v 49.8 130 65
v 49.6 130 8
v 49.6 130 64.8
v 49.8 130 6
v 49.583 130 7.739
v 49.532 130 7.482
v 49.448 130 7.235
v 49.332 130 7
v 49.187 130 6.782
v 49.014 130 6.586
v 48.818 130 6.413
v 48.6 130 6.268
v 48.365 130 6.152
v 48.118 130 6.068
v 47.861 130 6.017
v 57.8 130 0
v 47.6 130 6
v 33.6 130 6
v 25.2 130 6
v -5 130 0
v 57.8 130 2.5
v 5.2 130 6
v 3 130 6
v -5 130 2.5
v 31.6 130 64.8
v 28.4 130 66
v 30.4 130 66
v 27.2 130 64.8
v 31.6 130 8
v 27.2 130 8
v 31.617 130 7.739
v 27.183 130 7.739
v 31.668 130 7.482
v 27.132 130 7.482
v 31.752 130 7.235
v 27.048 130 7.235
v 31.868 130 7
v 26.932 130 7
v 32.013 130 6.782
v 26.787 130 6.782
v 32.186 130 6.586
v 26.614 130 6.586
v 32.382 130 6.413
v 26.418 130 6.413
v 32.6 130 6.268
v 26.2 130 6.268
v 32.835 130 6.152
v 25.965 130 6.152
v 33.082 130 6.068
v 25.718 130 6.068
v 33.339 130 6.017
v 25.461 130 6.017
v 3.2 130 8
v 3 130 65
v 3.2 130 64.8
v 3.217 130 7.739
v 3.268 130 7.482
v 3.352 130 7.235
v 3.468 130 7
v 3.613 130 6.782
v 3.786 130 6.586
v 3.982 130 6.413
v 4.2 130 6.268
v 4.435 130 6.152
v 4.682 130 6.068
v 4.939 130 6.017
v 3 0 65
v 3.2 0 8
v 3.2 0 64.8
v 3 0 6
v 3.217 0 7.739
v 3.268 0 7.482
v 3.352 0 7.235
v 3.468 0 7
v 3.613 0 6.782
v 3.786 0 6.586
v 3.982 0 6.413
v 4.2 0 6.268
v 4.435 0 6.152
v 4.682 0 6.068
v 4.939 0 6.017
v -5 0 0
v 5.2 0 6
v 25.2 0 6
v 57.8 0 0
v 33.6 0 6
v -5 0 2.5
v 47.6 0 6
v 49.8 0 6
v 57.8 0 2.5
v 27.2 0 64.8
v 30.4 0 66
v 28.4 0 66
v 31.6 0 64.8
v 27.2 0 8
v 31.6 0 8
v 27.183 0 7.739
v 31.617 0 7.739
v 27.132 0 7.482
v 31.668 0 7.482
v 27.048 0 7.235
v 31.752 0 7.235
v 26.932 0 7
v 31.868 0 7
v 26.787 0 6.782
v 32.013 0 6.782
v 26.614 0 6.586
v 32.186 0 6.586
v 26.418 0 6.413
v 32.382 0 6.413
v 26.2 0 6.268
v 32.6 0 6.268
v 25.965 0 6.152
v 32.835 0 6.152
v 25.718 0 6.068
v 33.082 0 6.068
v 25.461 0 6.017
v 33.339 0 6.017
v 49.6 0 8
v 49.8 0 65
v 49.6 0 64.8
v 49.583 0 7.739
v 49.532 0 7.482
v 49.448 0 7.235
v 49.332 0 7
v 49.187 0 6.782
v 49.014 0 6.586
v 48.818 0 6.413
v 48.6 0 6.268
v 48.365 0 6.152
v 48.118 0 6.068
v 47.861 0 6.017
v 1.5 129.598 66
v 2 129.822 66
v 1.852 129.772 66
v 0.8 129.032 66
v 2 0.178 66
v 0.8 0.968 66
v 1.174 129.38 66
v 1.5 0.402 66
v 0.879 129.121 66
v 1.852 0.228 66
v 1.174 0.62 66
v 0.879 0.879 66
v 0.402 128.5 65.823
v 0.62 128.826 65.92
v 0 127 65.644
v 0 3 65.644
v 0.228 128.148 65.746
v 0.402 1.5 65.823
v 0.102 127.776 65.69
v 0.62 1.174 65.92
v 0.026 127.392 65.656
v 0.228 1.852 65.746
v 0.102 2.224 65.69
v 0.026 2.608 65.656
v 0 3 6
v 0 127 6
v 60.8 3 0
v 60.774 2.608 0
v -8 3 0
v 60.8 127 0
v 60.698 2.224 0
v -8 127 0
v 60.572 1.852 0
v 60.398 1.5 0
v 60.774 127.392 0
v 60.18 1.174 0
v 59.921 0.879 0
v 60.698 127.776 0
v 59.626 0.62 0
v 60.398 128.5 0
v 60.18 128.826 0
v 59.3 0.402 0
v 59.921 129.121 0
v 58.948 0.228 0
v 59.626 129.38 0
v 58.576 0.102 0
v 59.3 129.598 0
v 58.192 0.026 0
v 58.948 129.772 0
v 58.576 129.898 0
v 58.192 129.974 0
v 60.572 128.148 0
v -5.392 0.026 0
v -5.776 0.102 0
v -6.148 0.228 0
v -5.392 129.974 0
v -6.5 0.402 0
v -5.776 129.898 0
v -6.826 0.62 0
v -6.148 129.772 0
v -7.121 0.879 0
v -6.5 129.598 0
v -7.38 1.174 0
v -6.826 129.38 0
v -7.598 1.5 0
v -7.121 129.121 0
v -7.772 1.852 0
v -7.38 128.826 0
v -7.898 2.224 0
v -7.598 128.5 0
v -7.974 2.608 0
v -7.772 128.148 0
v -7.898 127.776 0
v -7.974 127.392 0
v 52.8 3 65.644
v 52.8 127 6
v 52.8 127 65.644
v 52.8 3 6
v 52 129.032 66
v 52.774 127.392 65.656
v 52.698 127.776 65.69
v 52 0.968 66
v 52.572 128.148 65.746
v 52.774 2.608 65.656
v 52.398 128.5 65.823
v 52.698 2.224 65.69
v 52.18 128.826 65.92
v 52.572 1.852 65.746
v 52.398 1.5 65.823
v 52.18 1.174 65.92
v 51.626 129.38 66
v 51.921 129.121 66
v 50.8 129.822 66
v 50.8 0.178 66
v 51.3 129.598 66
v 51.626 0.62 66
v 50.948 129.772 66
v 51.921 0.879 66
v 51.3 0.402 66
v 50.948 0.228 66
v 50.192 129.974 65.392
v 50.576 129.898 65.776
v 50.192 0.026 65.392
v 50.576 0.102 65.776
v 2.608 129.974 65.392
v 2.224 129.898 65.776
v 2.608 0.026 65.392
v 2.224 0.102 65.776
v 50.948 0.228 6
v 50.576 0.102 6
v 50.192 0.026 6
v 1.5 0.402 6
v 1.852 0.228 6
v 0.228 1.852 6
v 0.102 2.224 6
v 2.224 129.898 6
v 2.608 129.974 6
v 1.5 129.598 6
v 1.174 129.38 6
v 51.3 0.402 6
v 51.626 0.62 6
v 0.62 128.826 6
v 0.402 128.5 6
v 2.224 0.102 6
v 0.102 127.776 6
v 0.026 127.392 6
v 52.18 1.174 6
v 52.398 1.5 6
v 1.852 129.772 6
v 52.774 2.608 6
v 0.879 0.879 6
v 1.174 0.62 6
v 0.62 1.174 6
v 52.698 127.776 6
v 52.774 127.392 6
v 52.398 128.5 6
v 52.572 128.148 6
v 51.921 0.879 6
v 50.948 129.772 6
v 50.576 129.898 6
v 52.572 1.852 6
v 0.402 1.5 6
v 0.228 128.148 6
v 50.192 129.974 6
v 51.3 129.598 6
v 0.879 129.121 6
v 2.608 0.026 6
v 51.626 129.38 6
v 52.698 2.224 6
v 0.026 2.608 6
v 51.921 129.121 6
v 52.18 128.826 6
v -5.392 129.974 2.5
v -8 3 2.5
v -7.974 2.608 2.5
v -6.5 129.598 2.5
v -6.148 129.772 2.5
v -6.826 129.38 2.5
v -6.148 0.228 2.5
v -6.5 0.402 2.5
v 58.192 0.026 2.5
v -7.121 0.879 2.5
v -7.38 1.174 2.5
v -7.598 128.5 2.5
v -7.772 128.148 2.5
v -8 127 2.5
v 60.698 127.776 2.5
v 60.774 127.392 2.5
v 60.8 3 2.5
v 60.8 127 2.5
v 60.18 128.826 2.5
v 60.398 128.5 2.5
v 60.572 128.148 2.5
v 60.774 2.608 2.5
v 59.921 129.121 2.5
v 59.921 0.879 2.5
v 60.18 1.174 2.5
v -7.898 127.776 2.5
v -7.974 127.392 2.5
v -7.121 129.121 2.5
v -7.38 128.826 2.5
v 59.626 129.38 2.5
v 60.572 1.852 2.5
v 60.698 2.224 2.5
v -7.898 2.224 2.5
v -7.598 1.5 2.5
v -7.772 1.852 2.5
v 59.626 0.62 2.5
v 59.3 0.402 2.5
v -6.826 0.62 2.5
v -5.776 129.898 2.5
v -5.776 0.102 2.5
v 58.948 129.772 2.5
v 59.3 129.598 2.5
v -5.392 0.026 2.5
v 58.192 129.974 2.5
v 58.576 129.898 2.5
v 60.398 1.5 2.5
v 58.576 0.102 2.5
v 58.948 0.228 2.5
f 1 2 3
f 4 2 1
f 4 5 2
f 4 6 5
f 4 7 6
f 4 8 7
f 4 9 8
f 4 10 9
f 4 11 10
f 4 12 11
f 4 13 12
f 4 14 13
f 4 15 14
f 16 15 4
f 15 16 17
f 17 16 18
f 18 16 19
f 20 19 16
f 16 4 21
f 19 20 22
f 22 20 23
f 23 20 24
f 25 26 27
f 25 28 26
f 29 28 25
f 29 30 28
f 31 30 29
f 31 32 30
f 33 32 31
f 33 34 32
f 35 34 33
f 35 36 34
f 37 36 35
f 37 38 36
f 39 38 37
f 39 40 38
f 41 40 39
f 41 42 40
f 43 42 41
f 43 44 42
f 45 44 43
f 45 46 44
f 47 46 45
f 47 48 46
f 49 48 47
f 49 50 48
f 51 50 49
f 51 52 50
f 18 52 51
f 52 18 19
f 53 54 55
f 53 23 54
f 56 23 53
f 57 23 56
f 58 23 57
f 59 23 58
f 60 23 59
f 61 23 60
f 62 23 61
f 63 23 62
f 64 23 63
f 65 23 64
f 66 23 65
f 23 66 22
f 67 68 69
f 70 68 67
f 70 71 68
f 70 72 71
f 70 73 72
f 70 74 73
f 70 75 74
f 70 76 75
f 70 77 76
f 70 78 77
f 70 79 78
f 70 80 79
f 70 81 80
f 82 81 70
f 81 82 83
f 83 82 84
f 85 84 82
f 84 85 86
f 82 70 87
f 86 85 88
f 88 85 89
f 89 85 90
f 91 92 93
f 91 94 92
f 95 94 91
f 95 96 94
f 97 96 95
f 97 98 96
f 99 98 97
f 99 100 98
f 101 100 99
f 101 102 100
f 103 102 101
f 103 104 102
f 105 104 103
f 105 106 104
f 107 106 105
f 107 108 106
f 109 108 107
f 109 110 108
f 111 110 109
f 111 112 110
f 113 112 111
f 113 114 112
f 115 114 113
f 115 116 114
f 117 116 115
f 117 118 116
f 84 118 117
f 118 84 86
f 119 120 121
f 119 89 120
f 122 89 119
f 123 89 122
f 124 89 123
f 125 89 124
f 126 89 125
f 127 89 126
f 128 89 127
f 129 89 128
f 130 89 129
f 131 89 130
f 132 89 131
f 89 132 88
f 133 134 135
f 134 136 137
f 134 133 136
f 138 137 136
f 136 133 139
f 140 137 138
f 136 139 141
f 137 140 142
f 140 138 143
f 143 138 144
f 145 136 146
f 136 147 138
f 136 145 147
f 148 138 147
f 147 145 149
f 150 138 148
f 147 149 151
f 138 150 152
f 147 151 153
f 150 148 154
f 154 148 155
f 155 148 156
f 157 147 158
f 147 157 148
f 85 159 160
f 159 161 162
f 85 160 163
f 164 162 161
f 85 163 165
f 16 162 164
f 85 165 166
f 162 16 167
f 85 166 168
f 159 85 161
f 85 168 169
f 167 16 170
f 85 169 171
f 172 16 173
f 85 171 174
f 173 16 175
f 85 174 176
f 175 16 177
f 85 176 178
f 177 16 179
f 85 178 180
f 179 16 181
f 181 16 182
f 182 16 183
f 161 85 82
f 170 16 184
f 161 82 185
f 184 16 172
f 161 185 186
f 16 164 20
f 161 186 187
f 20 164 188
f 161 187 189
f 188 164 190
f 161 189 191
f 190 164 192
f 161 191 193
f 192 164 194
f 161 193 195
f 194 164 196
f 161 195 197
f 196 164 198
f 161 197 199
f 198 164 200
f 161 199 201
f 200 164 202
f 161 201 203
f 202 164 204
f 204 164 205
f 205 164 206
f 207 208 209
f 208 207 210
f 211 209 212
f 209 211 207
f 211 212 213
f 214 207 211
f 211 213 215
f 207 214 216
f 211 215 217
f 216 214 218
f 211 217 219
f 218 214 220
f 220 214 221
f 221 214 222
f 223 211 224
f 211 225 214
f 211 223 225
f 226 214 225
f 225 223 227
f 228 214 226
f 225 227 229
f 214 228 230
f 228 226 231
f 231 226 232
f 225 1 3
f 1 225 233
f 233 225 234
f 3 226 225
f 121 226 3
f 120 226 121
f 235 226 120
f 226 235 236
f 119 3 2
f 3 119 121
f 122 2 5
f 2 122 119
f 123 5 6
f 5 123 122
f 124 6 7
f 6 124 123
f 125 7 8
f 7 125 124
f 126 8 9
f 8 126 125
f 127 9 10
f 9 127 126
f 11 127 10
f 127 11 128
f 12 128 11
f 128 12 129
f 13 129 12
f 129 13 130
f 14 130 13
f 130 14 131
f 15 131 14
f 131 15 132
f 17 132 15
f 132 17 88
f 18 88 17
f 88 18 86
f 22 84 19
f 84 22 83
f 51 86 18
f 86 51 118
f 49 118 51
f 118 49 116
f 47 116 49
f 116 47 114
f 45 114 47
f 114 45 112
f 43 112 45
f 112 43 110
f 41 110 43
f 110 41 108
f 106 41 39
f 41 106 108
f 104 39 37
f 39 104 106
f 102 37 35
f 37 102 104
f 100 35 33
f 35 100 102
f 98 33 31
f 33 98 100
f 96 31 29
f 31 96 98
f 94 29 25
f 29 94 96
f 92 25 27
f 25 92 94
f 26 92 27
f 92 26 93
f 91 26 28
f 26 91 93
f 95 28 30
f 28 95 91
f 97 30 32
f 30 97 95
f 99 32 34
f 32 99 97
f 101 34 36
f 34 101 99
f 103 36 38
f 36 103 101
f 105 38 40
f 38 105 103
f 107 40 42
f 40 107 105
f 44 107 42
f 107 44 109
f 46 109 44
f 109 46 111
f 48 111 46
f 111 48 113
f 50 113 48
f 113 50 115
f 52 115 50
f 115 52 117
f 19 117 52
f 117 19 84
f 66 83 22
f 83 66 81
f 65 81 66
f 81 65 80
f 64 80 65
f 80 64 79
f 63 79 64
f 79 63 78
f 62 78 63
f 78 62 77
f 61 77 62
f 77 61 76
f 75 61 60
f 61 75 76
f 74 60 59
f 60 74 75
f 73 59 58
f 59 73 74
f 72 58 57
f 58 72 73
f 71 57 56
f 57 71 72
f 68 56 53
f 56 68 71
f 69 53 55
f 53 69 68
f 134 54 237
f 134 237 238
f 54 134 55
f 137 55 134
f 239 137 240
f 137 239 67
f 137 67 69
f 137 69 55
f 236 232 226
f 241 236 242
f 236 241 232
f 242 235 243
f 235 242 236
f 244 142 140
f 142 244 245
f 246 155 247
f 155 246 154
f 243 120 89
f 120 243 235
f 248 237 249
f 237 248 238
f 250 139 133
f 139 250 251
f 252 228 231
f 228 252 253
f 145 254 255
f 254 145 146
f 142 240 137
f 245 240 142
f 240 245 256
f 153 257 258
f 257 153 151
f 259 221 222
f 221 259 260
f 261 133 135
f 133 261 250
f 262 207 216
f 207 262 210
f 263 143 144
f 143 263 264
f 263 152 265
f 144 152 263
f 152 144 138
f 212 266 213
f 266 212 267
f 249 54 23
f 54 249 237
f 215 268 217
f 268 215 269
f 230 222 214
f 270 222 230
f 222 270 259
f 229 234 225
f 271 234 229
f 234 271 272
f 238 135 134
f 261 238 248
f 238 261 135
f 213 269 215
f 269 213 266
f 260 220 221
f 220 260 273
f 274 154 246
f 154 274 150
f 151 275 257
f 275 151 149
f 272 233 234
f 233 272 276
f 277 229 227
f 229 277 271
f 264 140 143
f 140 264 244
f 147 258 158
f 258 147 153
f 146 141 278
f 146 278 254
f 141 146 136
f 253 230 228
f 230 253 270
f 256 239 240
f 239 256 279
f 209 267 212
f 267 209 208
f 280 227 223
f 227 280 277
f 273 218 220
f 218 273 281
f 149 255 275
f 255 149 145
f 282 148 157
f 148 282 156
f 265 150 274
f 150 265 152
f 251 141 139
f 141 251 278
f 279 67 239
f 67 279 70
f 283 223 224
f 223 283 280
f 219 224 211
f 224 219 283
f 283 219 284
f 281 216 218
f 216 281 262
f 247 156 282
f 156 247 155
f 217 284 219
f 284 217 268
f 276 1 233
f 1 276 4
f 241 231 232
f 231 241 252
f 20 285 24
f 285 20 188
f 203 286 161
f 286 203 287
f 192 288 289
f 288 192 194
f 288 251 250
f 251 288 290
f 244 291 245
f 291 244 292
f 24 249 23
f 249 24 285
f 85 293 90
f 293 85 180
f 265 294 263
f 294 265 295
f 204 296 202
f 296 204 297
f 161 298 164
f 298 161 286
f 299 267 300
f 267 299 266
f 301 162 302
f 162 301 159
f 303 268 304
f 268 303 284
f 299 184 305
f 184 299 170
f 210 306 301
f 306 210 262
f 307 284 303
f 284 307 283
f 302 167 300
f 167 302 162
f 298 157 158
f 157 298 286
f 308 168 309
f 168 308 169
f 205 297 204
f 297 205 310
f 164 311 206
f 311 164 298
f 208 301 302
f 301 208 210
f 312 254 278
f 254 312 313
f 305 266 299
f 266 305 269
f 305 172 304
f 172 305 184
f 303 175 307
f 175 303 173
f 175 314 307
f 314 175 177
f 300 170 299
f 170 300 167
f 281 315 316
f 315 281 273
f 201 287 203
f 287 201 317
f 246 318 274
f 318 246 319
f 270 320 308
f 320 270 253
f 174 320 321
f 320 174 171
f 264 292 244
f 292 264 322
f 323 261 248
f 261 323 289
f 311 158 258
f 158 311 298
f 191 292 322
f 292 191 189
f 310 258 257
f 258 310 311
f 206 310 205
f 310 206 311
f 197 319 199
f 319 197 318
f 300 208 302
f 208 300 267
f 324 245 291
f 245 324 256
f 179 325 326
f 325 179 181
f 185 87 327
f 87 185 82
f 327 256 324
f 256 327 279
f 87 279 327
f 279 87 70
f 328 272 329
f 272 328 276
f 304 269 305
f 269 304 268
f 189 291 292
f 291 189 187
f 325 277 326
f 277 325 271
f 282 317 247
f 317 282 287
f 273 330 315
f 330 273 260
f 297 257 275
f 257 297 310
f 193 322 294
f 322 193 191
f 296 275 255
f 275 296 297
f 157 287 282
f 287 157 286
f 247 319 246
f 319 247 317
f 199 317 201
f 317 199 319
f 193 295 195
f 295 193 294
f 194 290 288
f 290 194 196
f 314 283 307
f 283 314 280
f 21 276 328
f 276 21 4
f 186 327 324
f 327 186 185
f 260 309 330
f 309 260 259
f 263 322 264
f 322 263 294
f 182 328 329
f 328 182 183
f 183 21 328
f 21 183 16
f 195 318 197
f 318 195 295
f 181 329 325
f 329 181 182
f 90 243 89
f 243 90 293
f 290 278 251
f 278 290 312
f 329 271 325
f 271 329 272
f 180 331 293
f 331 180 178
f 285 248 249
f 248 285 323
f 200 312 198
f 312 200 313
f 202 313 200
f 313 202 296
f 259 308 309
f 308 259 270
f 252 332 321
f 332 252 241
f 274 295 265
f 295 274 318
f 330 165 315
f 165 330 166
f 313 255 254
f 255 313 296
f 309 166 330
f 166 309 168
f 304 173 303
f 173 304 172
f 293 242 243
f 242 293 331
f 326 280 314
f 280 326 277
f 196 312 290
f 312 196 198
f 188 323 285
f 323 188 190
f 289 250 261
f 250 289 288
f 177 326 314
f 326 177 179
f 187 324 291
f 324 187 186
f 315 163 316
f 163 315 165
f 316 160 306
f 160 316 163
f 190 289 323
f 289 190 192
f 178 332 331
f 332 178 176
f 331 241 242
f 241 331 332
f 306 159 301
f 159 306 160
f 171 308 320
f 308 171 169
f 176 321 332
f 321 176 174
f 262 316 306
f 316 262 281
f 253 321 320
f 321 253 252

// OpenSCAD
// Vertikaler Laptop-/Tablet-Ständer, 2 Schlitze in einem Teil
// Alle Maße in Millimetern (Regel: units-mm)
//
// Änderungen gegenüber 001 (Statik nachgerechnet, siehe Lastfälle unten):
//   - Fußleiste: unten 8 mm pro Seite Überstand, nach oben auf Körperbreite
//     auslaufend. Aufstandsbreite 68.8 mm, der Körper bleibt oben 52.8 mm.
//     Grund: der kritische Lastfall ist NICHT die Rippenfestigkeit, sondern
//     Kippen. Nur die Aufstandsbreite hilft dagegen nennenswert.
//   - base_d 110 -> 130 mm gegen Kippen in Längsrichtung. Kostet nur
//     Tischtiefe, nicht die knappe Tischbreite.
//   - floor_t 5 -> 6 mm. Der Sockel ist jetzt die Fußleiste, die äußere
//     Lippe soll nicht zu dünn auslaufen.
//
// Kontext (Regel: context-first), Stand bei Erstellung:
//   - context/printer.md:    Anycubic Kobra S1, 0.4mm Düse, PEI, 250mm Bauraum
//   - context/tolerances.md: eff. XY-Fehler ~0.15–0.2mm/Seite. Hier irrelevant
//                            für die Funktion (kein Passsitz), aber er macht
//                            die Schlitze real ~0.3–0.4mm schmaler als nominal
//                            -> im Puffer unten schon berücksichtigt.
//   - context/materials.md:  noch leer -> PLA angenommen
//
// Anforderungen aus dem Design-Dialog:
//   - Laptop 20mm dick, "ein wenig Puffer" -> 2.0mm Luft pro Seite
//   - iPad 15mm dick (mit Hülle)           -> 1.5mm Luft pro Seite
//   - Ein Teil, beide Schlitze nebeneinander
//   - Geräte stehen senkrecht, straff geführt (keine Neigung)
//   - Minimalistisch und schmal: auf dem Schreibtisch ist wenig Breite frei
//   - Nachgereicht: Kippsicherheit wichtiger als die letzten 16mm Breite,
//     solange der Körper oben schmal bleibt
//
// Aufbau / Prinzip:
//   Eine Fußleiste (foot_h hoch, foot_flare pro Seite breiter) trägt den
//   Sockel mit drei aufstehenden Rippen. Dazwischen die beiden Schlitze. Die
//   Schlitze laufen in Y komplett durch (vorne und hinten offen) – das spart
//   Material, macht das Teil leichter zu reinigen und erlaubt es, den Laptop
//   von jeder Seite einzuschieben.
//
//   Die schmale Seite (X) zeigt zum Nutzer, die lange Seite (Y, base_d) geht
//   in die Tischtiefe. Der Laptop steht also mit seiner Breitseite (~31cm)
//   in Y -> auf dem Tisch verbraucht der Ständer nur ~7cm Breite.
//
//   Schlitzmund und obere Außenkanten sind angefast (mouth_c/edge_c), der
//   Schlitzgrund hat eine Hohlkehle (fillet_r).
//
// ---------------------------------------------------------------------------
// LASTFÄLLE (nachgerechnet, nicht geschätzt)
// ---------------------------------------------------------------------------
//
// 1) Rippe auf Biegung – unkritisch, mit großem Abstand.
//    Rippe = einseitig eingespannter Balken, Länge wall_h, Querschnitt
//    base_d x wall_t. Die Biegespannung an der Wurzel wirkt in Z-Richtung,
//    also QUER zu den Layern -> maßgebend ist die Layerhaftung, konservativ
//    25 MPa (massives PLA hätte ~50).
//      Außenrippe 3.2mm: Bruch erst bei ~92 N Horizontalkraft an der
//                        Rippenoberkante (~9 kg).
//      Mittelrippe 4.4mm: ~175 N (~18 kg).
//    Real wirkt dort: der Laptop lehnt sich im Schlitzspiel (3.8°) an die
//    Rippe -> ~2.2 N, Durchbiegung ~0.12 mm. Sicherheitsfaktor ~40.
//    Das Eigengewicht (1.8kg senkrecht auf 24 x 130 mm Auflage) erzeugt
//    0.006 MPa Druckspannung – irrelevant.
//    -> Die Rippen sind nicht die Schwachstelle. Nicht dünner machen als
//       3.2/4.4, aber dicker bringt nichts außer Breite.
//
// 2) Kippen – das ist der kritische Lastfall.
//    Ungünstig ist NUR der Laptop im linken Schlitz: dann sitzt der
//    Schwerpunkt seitlich außermittig. Die echten Zahlen rechnet der
//    echo()-Block unten aus den aktuellen Parametern aus.
//    Mit 001 (52.8mm breit) warf ihn ein Schubs von ~130 g oben am Laptop
//    um. Mit der Fußleiste sind es ~200 g.
//    Ballast hilft kaum: 150 g Stahl mittig im Sockel bringen nur +14 %,
//    weil mittig eingebaute Masse den Hebelarm nicht verlängert.
//    Nur die Aufstandsbreite zählt.
//
// Druckausrichtung: So wie das Teil steht, Fußunterseite aufs Bett.
//   Keine Stützen nötig: die Schlitze öffnen nach oben, alle Fasen und die
//   Fußschräge sind nach oben gerichtete Flächen, es gibt keine Brücke und
//   keinen Überhang. Die plane 68.8 x 130mm Fläche auf PEI = sehr gute
//   Haftung.
//   Empfehlung: Infill >= 30%. Layerrichtung: die Rippen werden liegend
//   aufgebaut, seitliche Belastung zieht quer zu den Layern – deshalb die
//   konservative Rechnung oben mit 25 MPa.
//
// Nach dem Druck: 4 Filzgleiter unter den Fuß kleben. Das schützt den Tisch
//   und verhindert, dass der Ständer beim Einschieben wegrutscht.
//
// Anpassen: Laptop dicker/dünner -> nur laptop_t ändern, alles andere
//   rechnet sich mit (auch die Kipp-Rechnung im echo()).

/* [Geräte] */
// Dicke des Laptops (gemessen, geschlossen)
laptop_t = 20;
// Luft pro Seite im Laptop-Schlitz
laptop_gap = 2.0;
// Dicke des iPads inkl. Hülle
ipad_t = 15;
// Luft pro Seite im iPad-Schlitz
ipad_gap = 1.5;
// Zweiten Schlitz überhaupt bauen
ipad_slot_on = true;

/* [Geräte-Annahmen für die Kipp-Rechnung] */
// Masse des Laptops in Gramm (14-Zoll-Klasse). Nur für echo(), nicht für
// die Geometrie – bei Bedarf mit dem echten Wert überschreiben.
laptop_mass_g = 1800;
// Höhe des geschlossenen Laptops, auf der Kante stehend
laptop_dev_h = 220;
// Masse des iPads inkl. Hülle in Gramm
ipad_mass_g = 700;
// Höhe des iPads, auf der Kante stehend
ipad_dev_h = 180;

/* [Ständer] */
// Wandstärke der beiden Außenrippen. Muss dicker sein als mouth_c + edge_c,
// sonst läuft die Rippe oben auf eine Schneide aus (siehe assert unten).
wall_t = 3.2;
// Wandstärke der Mittelrippe (trennt beide Schlitze, trägt von zwei Seiten)
mid_wall = 4.4;
// Höhe der Rippen über dem Schlitzgrund = Einstecktiefe des Geräts
wall_h = 60;
// Dicke des massiven Sockels unter den Schlitzen (= Höhe der Fußleiste)
floor_t = 6.0;
// Tiefe des Ständers (Y, in die Tischtiefe)
base_d = 130;

/* [Fußleiste] */
// Überstand der Fußleiste pro Seite in X. Das ist der einzige wirksame
// Hebel gegen Kippen – siehe Lastfall 2 im Kopf.
foot_flare = 8.0;
// Höhe der Fußleiste. Muss <= floor_t bleiben, sonst ragt sie in die
// Schlitze (siehe assert unten).
foot_h = 6.0;
// Davon der untere, senkrechte Teil. Der Rest läuft schräg nach oben auf
// Körperbreite aus. Nicht auf 0 setzen: die äußere Lippe würde sonst
// spitz auslaufen und beim ersten Anstoßen abbrechen.
foot_straight = 2.5;

/* [Kanten] */
// Fase am Schlitzmund (Einführhilfe – die funktionale Fase)
mouth_c = 1.2;
// Fase an den oberen Außenkanten (nur Optik/Haptik, deshalb kleiner:
// mouth_c + edge_c fressen sonst die Rippe oben komplett auf)
edge_c = 0.8;
// Hohlkehle am Schlitzgrund (Kerbspannung an der Rippenwurzel)
fillet_r = 2.0;
// Radius der senkrechten Außenkanten
corner_r = 3.0;

/* [Qualität] */
$fn = 48;

// ---------------------------------------------------------------------------
// Abgeleitete Maße
// ---------------------------------------------------------------------------

laptop_w = laptop_t + 2 * laptop_gap;   // lichte Schlitzbreite Laptop
ipad_w   = ipad_t   + 2 * ipad_gap;     // lichte Schlitzbreite iPad

// X-Positionen der Rippen-/Schlitzkanten, von links (0 = linke Körperkante)
x1 = wall_t;                                            // Laptop-Schlitz links
x2 = x1 + laptop_w;                                     // Laptop-Schlitz rechts
x3 = x2 + (ipad_slot_on ? mid_wall : 0);                // iPad-Schlitz links
x4 = x3 + (ipad_slot_on ? ipad_w : 0);                  // iPad-Schlitz rechts

total_w = x4 + wall_t;                  // Körperbreite oben
total_h = floor_t + wall_h;
foot_w  = total_w + 2 * foot_flare;     // Aufstandsbreite unten

// ---------------------------------------------------------------------------
// Kipp-Rechnung: Schwerpunkt der Einheit Ständer + Gerät(e)
// ---------------------------------------------------------------------------
// Alle x-Werte ab der LINKEN KANTE DER AUFSTANDSFLÄCHE, damit die Abstände
// direkt die Hebelarme zur Kippkante sind. Der Körper beginnt also bei
// x = foot_flare.

// Eigenmasse, grob: Volumen mal PLA-Dichte mal effektive Füllung. Die Rippen
// drucken bei 3.2/4.4mm Wandstärke praktisch massiv, der Sockel nicht ->
// ~0.6 im Mittel. Nur für die Rechnung, nicht kritisch.
vol_body   = total_w * base_d * floor_t
           + (2 * wall_t + (ipad_slot_on ? mid_wall : 0)) * base_d * wall_h;
vol_foot   = 2 * foot_flare * base_d * (foot_straight + (foot_h - foot_straight) / 2);
stand_g    = (vol_body + vol_foot) * 1.24e-3 * 0.6;

x_laptop   = foot_flare + x1 + laptop_w / 2;   // Schlitzmitte Laptop
x_ipad     = foot_flare + x3 + ipad_w / 2;     // Schlitzmitte iPad

// Schwerpunkt für eine Lastkombination. Rückgabe: [Masse, x, z]
function cog(ms, xs, zs) =
    let (M = ms[0] + ms[1] + ms[2])
    [ M,
      (ms[0]*xs[0] + ms[1]*xs[1] + ms[2]*xs[2]) / M,
      (ms[0]*zs[0] + ms[1]*zs[1] + ms[2]*zs[2]) / M ];

// Kippwinkel = atan(Hebelarm zur nächsten Kippkante / Schwerpunkthöhe)
function tip_angle(c) = atan(min(c[1], foot_w - c[1]) / c[2]);
// Horizontalkraft oben am Gerät, die zum Umkippen reicht, in Gramm-Äquivalent
function tip_push_g(c, push_h) = c[0] * min(c[1], foot_w - c[1]) / push_h;

c_lap  = cog([stand_g, laptop_mass_g, 0],
             [foot_w/2, x_laptop, 0],
             [floor_t * 0.9, floor_t + laptop_dev_h/2, 0]);
c_both = cog([stand_g, laptop_mass_g, ipad_mass_g],
             [foot_w/2, x_laptop, x_ipad],
             [floor_t * 0.9, floor_t + laptop_dev_h/2, floor_t + ipad_dev_h/2]);

// Längskippen: wie weit darf der Laptop in Y aus der Mitte stehen
y_off_max = (base_d / 2) * c_lap[0] / laptop_mass_g;

// Spiel des Geräts im Schlitz: um so viel Grad kann es im Schlitz kippeln
play_deg_l = atan(2 * laptop_gap / wall_h);
play_deg_i = atan(2 * ipad_gap / wall_h);

// Rippenfestigkeit (Lastfall 1): Bruchkraft an der Rippenoberkante.
// W = Widerstandsmoment des Rippenquerschnitts, sigma_z = Layerhaftung.
sigma_z   = 25;    // MPa, konservativ für PLA quer zu den Layern
f_break_o = sigma_z * (base_d * wall_t   * wall_t   / 6) / wall_h;
f_break_m = sigma_z * (base_d * mid_wall * mid_wall / 6) / wall_h;

// ---------------------------------------------------------------------------
// Prüfungen (Regel: printability-report – wird gemeldet, nicht stillschweigend
// korrigiert)
// ---------------------------------------------------------------------------

nozzle_d = 0.4;

// Restbreite der Rippen ganz oben, nachdem die Fasen abgezogen sind. Das ist
// die kritische Größe: läuft eine Rippe oben auf eine Schneide aus, kann der
// Drucker die letzten Layer nicht mehr sauber legen und die Kante wird
// ausgefranst und bröselig.
outer_top_w = wall_t   - mouth_c - edge_c;
mid_top_w   = mid_wall - 2 * mouth_c;

assert(wall_t   >= 2 * nozzle_d, "wall_t unter 2x Duesendurchmesser");
assert(mid_wall >= 2 * nozzle_d, "mid_wall unter 2x Duesendurchmesser");
assert(floor_t  >= 2 * nozzle_d, "floor_t unter 2x Duesendurchmesser");
assert(fillet_r <= wall_h,       "fillet_r groesser als die Rippenhoehe");
assert(outer_top_w >= 2 * nozzle_d,
       "Aussenrippe laeuft oben spitz zu: wall_t erhoehen oder Fasen kleiner");
assert(!ipad_slot_on || mid_top_w >= 2 * nozzle_d,
       "Mittelrippe laeuft oben spitz zu: mid_wall erhoehen oder mouth_c kleiner");
assert(mouth_c * 2 < min(laptop_w, ipad_slot_on ? ipad_w : 1e9),
       "mouth_c zu gross - die Fasen fressen den Schlitz auf");
assert(foot_h <= floor_t,
       "foot_h groesser als floor_t - die Fussleiste ragt in die Schlitze");
assert(foot_straight > 0 && foot_straight <= foot_h,
       "foot_straight muss zwischen 0 und foot_h liegen");
assert(foot_straight >= 2 * nozzle_d,
       "Fusslippe laeuft spitz aus: foot_straight erhoehen");
assert(corner_r <= foot_w / 2 && corner_r <= base_d / 2,
       "corner_r groesser als das halbe Teil");
assert(foot_w <= 250 && base_d <= 250 && total_h <= 250,
       "passt nicht auf das Druckbett (250 x 250 x 250)");

echo(str("Aussenmasse: Koerper ", total_w, " mm breit, Fuss ", foot_w,
         " mm breit, Tiefe ", base_d, " mm, Hoehe ", total_h, " mm"));
echo(str("Schlitz Laptop: ", laptop_w, " mm lichte Weite fuer ", laptop_t, " mm Geraet"));
echo(str("Schlitz iPad:   ", ipad_slot_on ? ipad_w : 0, " mm lichte Weite fuer ", ipad_t, " mm Geraet"));
echo(str("Rippenbreite oben nach Fasen: aussen ", outer_top_w, " mm, mitte ", mid_top_w, " mm"));
echo(str("Staender-Eigenmasse (geschaetzt, 30% Infill): ", round(stand_g), " g"));
echo(str("Lastfall 1 Rippenbruch: aussen ", round(f_break_o), " N, mitte ",
         round(f_break_m), " N an der Rippenoberkante"));
echo(str("Lastfall 2 Kippen, NUR Laptop links: ", tip_angle(c_lap),
         " Grad, Schubs oben ", round(tip_push_g(c_lap, floor_t + laptop_dev_h)), " g"));
echo(str("Lastfall 2 Kippen, beide Geraete:    ", tip_angle(c_both),
         " Grad, Schubs oben ", round(tip_push_g(c_both, floor_t + laptop_dev_h)), " g"));
echo(str("Laengskippen: Laptop darf max ", round(y_off_max), " mm aus der Mitte stehen"));
echo(str("Kippeln im Schlitz: Laptop ", play_deg_l, " Grad, iPad ", play_deg_i, " Grad"));

// ---------------------------------------------------------------------------
// 2D-Querschnitt des Körpers (X = Breite, Y der 2D-Ebene = Höhe Z des Teils)
// ---------------------------------------------------------------------------

// Material, das in eine Innenecke des Schlitzgrunds zurückgelegt wird:
// Quadrat minus Kreis = Hohlkehle. dir = +1 linke Ecke, -1 rechte Ecke.
module fillet_piece(x, dir) {
    r = fillet_r;
    translate([x, floor_t])
        difference() {
            translate([dir > 0 ? 0 : -r, 0]) square([r, r]);
            translate([dir * r, r]) circle(r = r);
        }
}

// Schnittfigur eines Schlitzes: Rechteck nach oben offen + Trichter am Mund.
module slot_cut(a, b) {
    c = mouth_c;
    union() {
        translate([a, floor_t]) square([b - a, total_h - floor_t + 1]);
        polygon([
            [a,     total_h - c],
            [b,     total_h - c],
            [b + c, total_h    ],
            [b + c, total_h + 1],
            [a - c, total_h + 1],
            [a - c, total_h    ]
        ]);
    }
}

module profile() {
    c = edge_c;
    union() {
        difference() {
            square([total_w, total_h]);

            slot_cut(x1, x2);
            if (ipad_slot_on) slot_cut(x3, x4);

            // Fasen an den oberen Außenkanten
            polygon([[-1, total_h - c], [c, total_h],
                     [c, total_h + 1], [-1, total_h + 1]]);
            polygon([[total_w + 1, total_h - c], [total_w - c, total_h],
                     [total_w - c, total_h + 1], [total_w + 1, total_h + 1]]);
        }

        // Hohlkehlen am Schlitzgrund
        fillet_piece(x1,  1);
        fillet_piece(x2, -1);
        if (ipad_slot_on) {
            fillet_piece(x3,  1);
            fillet_piece(x4, -1);
        }
    }
}

// ---------------------------------------------------------------------------
// Körper
// ---------------------------------------------------------------------------

// Prisma mit gerundeten senkrechten Kanten, Ursprung linke vordere Ecke
module rounded_prism(w, d, h) {
    linear_extrude(height = h)
        offset(r = corner_r) offset(delta = -corner_r)
            square([w, d]);
}

// Der eigentliche Ständer, ohne Fuß. Sitzt bei x = 0 .. total_w.
module koerper() {
    intersection() {
        // Querschnitt entlang Y ausziehen
        rotate([90, 0, 0])
            translate([0, 0, -base_d])
                linear_extrude(height = base_d)
                    profile();

        translate([0, 0, -1]) rounded_prism(total_w, base_d, total_h + 2);
    }
}

// Fußleiste: unten foot_straight senkrecht auf voller Breite, darüber per
// hull() schräg auf Körperbreite auslaufend. hull() zwischen den beiden
// Scheiben übernimmt automatisch die Eckenrundung beider Grundrisse.
module fuss() {
    eps = 0.01;
    hull() {
        translate([-foot_flare, 0, 0])
            rounded_prism(foot_w, base_d, foot_straight);
        translate([0, 0, foot_h - eps])
            rounded_prism(total_w, base_d, eps);
    }
}

module staender() {
    render(convexity = 10)
        union() {
            koerper();
            fuss();
        }
}

// Auf false setzen (oder per CLI -D render_part=false), wenn die Datei nur
// als Modulquelle für Schnitt-/Prüfskripte eingebunden wird.
render_part = true;
if (render_part) staender();
